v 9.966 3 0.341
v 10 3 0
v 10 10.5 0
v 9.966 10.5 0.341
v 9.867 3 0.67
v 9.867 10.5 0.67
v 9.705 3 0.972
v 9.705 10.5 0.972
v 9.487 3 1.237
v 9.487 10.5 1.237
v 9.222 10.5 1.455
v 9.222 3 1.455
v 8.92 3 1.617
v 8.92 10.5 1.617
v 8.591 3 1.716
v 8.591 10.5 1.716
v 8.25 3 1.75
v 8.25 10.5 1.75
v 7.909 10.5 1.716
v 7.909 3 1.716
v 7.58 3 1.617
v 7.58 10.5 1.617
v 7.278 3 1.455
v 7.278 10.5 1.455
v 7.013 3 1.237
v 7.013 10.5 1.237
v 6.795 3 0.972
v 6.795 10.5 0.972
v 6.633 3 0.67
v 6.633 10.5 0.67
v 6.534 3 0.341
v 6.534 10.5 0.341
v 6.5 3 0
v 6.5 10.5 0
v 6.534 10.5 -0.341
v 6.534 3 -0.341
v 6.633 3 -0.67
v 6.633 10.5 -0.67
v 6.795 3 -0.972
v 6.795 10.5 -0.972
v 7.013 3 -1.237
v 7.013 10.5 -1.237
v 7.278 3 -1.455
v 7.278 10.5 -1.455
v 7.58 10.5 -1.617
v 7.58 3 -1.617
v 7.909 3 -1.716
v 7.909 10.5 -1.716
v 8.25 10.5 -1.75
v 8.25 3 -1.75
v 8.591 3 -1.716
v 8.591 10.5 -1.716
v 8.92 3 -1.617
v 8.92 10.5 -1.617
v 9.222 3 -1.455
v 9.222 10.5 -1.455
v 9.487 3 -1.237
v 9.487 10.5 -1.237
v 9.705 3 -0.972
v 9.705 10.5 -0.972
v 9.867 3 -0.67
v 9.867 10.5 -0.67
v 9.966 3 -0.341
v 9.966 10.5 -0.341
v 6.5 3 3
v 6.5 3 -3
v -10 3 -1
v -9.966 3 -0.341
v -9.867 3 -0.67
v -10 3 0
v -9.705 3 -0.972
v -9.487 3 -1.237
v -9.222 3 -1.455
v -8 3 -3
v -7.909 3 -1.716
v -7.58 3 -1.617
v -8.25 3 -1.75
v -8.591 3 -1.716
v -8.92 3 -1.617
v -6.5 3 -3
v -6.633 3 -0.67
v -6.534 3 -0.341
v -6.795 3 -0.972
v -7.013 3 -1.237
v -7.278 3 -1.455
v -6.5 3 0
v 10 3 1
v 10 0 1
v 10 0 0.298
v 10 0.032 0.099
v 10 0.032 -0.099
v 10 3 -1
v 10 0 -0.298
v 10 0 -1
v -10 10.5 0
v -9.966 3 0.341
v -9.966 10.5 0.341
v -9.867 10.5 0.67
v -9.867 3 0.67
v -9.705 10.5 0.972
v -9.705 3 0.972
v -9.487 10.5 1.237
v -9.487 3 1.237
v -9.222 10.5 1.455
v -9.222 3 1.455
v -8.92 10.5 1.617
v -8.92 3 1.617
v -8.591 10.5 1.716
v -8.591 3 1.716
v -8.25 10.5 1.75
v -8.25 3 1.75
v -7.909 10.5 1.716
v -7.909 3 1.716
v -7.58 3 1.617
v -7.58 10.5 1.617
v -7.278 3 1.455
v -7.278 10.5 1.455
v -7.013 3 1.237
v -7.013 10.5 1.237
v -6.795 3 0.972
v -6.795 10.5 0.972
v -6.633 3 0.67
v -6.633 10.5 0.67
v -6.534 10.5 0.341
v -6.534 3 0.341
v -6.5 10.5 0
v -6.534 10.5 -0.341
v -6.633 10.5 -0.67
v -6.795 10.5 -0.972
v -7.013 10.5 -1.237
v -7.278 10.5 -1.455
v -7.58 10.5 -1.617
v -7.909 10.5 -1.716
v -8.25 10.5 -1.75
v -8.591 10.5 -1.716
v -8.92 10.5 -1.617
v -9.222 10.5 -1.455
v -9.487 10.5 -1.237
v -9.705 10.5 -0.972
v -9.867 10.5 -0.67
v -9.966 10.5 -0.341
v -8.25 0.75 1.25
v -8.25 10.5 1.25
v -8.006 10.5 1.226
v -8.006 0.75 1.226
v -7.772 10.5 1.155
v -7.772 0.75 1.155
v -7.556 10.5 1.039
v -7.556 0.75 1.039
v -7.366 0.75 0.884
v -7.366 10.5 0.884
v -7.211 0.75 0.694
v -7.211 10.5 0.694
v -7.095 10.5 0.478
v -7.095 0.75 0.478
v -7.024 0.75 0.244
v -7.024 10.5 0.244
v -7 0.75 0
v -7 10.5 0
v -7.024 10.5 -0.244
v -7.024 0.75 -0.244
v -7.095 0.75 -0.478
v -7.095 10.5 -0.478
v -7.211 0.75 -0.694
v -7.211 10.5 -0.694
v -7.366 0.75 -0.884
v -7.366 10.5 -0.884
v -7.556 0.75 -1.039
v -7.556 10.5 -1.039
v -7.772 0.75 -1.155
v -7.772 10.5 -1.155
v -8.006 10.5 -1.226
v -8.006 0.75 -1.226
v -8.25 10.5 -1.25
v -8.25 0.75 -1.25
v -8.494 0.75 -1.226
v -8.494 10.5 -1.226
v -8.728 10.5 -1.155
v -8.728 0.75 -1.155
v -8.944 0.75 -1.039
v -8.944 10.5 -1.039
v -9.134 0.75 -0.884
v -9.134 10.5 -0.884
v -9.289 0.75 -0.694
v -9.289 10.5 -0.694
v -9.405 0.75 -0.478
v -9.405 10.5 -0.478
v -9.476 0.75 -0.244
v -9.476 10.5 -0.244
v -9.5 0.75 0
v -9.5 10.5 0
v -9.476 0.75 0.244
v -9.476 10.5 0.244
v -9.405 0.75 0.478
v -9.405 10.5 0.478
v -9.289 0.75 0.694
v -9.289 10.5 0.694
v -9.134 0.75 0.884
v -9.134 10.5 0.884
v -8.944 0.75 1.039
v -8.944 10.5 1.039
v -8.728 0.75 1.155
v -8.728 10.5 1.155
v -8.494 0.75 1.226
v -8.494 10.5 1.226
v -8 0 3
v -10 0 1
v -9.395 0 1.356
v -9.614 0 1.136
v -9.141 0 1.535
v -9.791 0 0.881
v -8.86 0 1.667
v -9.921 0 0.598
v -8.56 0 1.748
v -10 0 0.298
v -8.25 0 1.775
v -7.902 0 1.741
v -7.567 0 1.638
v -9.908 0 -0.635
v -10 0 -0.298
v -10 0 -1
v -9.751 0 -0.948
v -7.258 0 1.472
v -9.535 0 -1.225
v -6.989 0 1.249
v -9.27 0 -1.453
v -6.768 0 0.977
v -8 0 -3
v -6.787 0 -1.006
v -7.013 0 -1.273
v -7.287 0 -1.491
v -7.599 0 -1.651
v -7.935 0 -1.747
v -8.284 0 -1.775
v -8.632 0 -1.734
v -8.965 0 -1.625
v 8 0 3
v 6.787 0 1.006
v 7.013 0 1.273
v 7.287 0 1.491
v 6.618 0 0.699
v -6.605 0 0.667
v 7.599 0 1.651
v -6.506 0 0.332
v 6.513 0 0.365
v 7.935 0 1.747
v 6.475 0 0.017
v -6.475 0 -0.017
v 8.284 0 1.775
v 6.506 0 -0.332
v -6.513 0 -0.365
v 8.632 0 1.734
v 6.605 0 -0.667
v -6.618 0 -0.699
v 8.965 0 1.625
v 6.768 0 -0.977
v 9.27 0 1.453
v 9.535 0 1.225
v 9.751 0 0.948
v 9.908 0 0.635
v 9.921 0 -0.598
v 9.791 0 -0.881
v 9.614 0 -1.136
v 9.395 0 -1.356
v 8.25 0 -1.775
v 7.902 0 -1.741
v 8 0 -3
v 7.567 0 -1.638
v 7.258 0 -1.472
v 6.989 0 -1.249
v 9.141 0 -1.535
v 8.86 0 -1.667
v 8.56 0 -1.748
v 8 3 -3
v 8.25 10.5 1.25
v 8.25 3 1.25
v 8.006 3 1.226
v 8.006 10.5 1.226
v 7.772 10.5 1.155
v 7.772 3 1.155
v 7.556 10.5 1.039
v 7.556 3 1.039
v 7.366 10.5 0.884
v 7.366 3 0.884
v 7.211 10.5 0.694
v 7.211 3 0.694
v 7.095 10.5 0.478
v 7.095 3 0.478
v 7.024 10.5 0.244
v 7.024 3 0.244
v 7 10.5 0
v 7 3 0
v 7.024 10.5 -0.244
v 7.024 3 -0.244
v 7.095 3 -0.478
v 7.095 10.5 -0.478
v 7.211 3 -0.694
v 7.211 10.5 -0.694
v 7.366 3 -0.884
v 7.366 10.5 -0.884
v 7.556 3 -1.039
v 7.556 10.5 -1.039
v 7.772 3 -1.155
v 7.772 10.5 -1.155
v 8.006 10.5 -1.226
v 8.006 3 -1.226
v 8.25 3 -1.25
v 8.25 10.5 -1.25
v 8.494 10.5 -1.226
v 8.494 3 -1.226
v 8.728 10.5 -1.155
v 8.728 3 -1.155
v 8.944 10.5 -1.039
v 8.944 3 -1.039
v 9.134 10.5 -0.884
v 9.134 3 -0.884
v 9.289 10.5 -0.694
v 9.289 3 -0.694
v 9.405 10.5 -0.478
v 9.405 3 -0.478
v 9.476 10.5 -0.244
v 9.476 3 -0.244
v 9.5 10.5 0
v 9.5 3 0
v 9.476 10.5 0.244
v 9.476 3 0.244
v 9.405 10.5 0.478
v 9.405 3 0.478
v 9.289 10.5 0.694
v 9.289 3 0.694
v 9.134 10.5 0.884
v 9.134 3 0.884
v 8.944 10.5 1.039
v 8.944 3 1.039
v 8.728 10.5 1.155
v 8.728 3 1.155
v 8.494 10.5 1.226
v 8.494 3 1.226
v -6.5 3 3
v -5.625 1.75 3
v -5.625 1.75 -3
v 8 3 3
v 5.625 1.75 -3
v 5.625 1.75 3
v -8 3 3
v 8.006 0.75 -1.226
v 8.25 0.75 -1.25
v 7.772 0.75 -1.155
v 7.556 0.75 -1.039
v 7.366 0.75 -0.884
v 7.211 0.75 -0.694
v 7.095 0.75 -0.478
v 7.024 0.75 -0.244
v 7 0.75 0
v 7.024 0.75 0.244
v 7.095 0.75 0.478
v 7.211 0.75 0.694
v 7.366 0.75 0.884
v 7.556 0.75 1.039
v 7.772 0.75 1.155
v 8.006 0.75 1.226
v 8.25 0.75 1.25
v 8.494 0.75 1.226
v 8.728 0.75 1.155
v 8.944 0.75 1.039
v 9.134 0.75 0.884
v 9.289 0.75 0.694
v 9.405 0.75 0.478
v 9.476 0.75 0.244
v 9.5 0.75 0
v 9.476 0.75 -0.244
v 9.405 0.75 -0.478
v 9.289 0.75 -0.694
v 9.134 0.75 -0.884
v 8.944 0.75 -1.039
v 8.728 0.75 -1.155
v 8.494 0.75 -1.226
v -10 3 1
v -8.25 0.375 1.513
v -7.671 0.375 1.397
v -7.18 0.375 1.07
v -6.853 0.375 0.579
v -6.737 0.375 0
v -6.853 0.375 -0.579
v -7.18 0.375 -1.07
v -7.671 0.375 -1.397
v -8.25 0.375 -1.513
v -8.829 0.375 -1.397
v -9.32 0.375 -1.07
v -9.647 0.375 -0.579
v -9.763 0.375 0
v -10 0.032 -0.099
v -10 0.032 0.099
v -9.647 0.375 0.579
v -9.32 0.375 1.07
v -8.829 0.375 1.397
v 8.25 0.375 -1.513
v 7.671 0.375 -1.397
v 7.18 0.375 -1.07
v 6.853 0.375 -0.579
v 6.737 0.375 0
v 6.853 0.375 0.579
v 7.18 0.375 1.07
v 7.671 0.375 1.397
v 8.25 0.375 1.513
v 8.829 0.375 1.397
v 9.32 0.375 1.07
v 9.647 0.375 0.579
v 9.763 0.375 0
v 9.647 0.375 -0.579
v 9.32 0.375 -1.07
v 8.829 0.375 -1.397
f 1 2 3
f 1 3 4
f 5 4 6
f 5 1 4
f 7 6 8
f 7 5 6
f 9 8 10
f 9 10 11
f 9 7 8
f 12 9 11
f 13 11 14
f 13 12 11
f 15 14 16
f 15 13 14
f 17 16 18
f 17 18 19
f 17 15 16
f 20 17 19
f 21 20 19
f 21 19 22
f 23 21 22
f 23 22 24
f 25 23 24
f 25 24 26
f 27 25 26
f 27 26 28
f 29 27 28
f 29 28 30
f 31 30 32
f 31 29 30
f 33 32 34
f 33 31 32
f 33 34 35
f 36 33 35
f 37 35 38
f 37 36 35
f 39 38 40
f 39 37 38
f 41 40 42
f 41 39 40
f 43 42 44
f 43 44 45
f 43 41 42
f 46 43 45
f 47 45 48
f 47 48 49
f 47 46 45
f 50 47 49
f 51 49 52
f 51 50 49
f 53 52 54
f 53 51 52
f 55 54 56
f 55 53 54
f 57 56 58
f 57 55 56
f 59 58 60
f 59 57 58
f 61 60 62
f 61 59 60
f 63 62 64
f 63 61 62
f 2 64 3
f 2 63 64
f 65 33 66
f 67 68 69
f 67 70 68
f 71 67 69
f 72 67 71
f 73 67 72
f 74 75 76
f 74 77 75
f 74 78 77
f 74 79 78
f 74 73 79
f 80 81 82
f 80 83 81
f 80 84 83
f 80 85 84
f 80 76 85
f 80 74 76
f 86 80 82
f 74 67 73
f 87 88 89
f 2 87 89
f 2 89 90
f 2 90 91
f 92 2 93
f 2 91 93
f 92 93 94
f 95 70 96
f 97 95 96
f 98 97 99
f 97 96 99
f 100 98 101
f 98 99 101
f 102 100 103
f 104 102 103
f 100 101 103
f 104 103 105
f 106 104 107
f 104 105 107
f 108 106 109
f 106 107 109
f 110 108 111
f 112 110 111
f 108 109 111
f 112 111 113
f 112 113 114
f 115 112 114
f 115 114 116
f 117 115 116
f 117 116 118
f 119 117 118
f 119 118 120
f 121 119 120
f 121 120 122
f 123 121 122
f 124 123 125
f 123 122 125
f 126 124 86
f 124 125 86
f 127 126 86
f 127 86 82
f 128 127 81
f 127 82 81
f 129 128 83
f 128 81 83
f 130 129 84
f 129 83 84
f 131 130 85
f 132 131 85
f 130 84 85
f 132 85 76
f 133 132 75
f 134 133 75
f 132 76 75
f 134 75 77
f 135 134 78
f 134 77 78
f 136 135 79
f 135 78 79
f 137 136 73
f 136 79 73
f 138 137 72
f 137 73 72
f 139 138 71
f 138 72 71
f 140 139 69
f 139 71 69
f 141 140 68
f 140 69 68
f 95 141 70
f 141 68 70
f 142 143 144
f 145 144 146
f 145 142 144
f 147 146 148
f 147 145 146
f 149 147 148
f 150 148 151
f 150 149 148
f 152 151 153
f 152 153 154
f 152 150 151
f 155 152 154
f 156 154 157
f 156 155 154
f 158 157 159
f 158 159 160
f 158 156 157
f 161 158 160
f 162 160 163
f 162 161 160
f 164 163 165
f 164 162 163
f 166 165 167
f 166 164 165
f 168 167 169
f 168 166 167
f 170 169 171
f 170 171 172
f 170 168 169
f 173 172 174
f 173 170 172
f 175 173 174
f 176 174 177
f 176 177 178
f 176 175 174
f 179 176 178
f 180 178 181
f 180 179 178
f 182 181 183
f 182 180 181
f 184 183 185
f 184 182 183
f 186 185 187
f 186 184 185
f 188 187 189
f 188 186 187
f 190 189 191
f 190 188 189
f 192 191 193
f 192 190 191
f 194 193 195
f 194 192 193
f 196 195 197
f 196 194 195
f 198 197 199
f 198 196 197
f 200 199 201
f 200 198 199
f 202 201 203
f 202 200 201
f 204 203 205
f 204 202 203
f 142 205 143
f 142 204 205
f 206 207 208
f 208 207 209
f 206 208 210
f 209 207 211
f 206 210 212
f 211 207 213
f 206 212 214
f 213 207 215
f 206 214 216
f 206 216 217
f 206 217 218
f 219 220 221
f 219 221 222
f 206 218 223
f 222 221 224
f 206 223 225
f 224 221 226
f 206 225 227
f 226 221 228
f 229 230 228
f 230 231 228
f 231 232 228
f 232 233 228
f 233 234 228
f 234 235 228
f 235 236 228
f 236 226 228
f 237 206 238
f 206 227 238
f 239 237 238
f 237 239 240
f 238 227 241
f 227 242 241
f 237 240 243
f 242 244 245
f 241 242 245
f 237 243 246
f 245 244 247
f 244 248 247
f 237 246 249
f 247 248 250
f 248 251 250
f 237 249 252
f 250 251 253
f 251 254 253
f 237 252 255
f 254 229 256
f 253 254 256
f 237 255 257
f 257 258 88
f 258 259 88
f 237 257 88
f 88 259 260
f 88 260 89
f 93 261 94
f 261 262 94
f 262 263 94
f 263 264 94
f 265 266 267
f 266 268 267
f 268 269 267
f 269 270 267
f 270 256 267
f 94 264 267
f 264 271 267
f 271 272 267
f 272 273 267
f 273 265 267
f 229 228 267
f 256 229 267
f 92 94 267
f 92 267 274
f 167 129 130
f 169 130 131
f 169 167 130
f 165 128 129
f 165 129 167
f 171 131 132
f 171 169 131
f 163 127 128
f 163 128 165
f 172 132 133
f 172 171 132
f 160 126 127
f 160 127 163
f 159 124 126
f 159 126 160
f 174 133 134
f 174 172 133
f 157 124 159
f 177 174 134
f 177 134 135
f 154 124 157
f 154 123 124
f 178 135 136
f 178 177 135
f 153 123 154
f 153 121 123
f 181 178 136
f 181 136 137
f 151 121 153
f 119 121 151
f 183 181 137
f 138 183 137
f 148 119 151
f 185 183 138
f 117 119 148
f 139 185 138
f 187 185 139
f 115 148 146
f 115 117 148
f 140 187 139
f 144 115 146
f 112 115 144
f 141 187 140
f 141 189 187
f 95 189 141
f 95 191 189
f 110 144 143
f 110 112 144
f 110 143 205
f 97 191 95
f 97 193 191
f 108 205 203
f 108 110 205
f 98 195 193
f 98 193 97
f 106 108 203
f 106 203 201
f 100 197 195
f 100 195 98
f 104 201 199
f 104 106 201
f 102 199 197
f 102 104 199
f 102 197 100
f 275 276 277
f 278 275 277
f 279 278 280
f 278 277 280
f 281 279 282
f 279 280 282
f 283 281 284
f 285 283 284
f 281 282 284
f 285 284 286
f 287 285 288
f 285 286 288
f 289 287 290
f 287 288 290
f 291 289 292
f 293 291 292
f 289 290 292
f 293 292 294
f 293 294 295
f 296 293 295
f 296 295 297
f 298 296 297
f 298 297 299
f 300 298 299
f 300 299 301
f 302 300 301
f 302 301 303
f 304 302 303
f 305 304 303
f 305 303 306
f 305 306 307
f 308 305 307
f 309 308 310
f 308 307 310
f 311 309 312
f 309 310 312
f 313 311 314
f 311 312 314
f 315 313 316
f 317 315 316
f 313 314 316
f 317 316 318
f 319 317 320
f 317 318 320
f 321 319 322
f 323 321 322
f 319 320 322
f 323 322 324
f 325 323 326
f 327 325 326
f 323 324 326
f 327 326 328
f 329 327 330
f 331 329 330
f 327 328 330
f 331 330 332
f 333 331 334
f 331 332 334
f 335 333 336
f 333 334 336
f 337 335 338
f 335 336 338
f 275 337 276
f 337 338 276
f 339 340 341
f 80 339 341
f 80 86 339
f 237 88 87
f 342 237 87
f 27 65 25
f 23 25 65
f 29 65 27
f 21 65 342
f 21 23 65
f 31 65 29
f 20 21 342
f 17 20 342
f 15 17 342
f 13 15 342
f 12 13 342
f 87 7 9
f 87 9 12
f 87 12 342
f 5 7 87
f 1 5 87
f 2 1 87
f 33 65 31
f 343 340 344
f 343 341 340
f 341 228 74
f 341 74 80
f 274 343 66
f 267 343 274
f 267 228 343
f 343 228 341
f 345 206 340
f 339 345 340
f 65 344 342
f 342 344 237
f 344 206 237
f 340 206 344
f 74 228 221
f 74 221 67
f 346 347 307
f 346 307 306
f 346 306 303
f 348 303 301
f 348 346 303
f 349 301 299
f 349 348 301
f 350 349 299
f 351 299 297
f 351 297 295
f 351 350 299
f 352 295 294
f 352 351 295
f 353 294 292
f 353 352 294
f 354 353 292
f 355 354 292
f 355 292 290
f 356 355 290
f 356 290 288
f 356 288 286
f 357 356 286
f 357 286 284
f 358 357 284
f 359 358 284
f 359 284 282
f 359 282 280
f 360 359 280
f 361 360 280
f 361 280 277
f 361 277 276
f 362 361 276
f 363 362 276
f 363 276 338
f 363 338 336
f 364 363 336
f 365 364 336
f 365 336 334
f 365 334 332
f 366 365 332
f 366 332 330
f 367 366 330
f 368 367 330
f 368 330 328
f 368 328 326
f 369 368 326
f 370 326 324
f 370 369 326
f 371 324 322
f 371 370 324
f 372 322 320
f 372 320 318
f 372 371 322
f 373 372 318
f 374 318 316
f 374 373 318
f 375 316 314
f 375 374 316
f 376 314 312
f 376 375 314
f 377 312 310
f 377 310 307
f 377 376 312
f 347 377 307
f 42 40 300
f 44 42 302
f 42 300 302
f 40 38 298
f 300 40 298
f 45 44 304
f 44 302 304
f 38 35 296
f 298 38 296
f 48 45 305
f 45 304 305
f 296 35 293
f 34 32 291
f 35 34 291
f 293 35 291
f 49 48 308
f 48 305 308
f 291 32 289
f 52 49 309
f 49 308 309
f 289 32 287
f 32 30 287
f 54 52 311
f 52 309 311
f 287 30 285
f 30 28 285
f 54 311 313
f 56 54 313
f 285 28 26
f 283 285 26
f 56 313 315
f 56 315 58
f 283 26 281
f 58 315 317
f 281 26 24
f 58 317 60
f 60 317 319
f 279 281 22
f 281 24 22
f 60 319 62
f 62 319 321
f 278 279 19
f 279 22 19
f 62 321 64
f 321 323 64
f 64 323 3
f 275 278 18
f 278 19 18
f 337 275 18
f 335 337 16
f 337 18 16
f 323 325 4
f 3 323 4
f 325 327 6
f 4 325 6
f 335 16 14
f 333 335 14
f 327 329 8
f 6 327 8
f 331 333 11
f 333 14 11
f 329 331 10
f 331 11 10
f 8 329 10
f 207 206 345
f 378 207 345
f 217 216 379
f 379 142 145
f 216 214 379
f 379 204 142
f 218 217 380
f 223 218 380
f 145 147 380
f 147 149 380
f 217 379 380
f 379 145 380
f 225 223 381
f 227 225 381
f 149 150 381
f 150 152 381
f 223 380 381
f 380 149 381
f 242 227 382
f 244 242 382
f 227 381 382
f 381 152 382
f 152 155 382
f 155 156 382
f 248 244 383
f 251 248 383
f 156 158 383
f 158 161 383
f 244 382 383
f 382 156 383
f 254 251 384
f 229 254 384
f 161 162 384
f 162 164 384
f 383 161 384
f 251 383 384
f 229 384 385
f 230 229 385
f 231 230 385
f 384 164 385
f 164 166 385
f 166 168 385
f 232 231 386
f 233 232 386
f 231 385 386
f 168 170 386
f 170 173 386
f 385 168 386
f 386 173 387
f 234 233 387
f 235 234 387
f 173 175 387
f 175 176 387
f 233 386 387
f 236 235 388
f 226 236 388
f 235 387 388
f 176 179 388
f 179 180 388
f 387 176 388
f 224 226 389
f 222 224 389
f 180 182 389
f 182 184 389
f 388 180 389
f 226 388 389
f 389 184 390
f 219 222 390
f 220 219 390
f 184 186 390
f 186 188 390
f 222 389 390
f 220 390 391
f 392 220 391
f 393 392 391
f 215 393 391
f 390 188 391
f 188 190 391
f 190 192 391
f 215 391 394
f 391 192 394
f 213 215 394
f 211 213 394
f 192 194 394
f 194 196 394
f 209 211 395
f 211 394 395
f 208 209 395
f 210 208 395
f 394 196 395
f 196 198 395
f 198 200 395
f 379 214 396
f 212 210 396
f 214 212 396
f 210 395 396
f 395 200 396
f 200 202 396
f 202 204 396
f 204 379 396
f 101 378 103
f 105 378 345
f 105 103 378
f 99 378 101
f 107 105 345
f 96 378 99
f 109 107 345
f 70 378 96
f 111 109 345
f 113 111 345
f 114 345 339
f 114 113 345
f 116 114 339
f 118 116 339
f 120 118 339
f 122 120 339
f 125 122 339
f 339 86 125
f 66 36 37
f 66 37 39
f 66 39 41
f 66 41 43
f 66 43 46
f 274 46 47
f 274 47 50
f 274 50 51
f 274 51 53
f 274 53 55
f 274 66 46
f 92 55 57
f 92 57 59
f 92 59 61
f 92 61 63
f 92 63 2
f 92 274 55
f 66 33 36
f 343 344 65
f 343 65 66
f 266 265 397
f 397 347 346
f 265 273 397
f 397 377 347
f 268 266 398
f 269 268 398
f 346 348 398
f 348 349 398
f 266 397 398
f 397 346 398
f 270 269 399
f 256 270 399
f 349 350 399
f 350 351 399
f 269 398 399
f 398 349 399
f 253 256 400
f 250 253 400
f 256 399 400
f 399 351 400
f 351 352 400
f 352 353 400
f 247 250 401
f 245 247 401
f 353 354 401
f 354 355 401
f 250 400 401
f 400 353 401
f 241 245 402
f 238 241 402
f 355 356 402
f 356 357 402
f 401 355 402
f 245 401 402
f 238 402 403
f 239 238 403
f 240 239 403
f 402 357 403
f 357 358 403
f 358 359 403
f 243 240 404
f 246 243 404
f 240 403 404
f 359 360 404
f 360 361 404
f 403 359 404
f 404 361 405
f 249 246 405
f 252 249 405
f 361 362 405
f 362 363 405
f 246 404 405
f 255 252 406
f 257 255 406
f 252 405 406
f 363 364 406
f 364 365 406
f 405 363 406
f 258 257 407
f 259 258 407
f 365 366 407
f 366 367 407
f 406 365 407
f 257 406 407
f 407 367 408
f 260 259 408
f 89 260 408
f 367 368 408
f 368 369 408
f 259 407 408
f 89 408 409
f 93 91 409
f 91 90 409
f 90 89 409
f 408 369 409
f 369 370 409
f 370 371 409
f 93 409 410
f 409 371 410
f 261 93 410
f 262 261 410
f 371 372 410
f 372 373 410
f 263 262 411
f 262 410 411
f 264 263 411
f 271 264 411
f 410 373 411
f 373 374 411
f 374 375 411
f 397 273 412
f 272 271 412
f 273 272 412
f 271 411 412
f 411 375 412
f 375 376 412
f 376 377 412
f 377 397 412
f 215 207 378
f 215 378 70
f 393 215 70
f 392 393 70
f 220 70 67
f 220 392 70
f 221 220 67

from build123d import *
from OCP.BRepFilletAPI import BRepFilletAPI_MakeChamfer

# Parameters (mm, degrees)
SKETCH1_W           = 20
SKETCH1_H           = 6
SKETCH1_R           = 1.25
BOSS_EXTRUDE1_DEPTH = 3
SKETCH2_W           = 13
SKETCH2_H           = 6
CUT_EXTRUDE1_DEPTH  = 1.25
CHAMFER1_SIZE       = 2
SKETCH3_R           = 1.75
SKETCH3_R_2         = 1.25
BOSS_EXTRUDE2_DEPTH = 7.5
CHAMFER2_SIZE       = 0.525155654
CHAMFER2_SIZE_2     = 0.75
CHAMFER3_SIZE       = 1.25
CHAMFER3_SIZE_2     = 0.875259423


# Some blends are built 0.0001 mm under size
with BuildPart() as part:
    # Sketch1 → Boss-Extrude1 (new body)
    with BuildSketch(Plane(origin=(0, 0, 0), x_dir=(1, 0, 0), z_dir=(0, 1, 0))):
        Rectangle(SKETCH1_W, SKETCH1_H)
        with Locations(Location((-8.25, 0, 0), (0, 0, 270))):
            Circle(SKETCH1_R, mode=Mode.SUBTRACT)
        with Locations(Location((8.25, 0, 0), (0, 0, 90))):
            Circle(SKETCH1_R, mode=Mode.SUBTRACT)
    extrude(amount=BOSS_EXTRUDE1_DEPTH)

    # Sketch2 → Cut-Extrude1 (cut)
    with BuildSketch(Plane(origin=(0, 3, 0), x_dir=(1, 0, 0), z_dir=(0, 1, 0))):
        Rectangle(SKETCH2_W, SKETCH2_H)
    extrude(amount=-CUT_EXTRUDE1_DEPTH, mode=Mode.SUBTRACT)

    # Chamfer1
    chamfer1_edges = [part.edges().sort_by_distance(p)[0] for p in [
        (10, 1.5, 3),
        (-10, 1.5, 3),
        (-10, 1.5, -3),
        (10, 1.5, -3),
    ]]
    chamfer(chamfer1_edges, length=CHAMFER1_SIZE)

    # Sketch3 → Boss-Extrude2 (add)
    with BuildSketch(Plane(origin=(0, 3, 0), x_dir=(1, 0, 0), z_dir=(0, 1, 0))):
        with Locations(Location((-8.25, 0, 0), (0, 0, 180))):
            Circle(SKETCH3_R)
        with Locations(Location((-8.25, 0, 0), (0, 0, 270))):
            Circle(SKETCH3_R_2, mode=Mode.SUBTRACT)
    boss_extrude2 = extrude(amount=BOSS_EXTRUDE2_DEPTH)

    # Mirror1: Boss-Extrude2 across plane
    add(boss_extrude2.mirror(Plane(origin=(0, 0, 0), x_dir=(0, 0, 1), z_dir=(1, 0, 0))))

    # Chamfer2
    # the kernel refuses this chamfer: 0.75, 0.525155654 mm, written as the material it takes off along each edge
    with BuildSketch(Plane(origin=(-8.25, 0, 0), x_dir=(0, 0, 1), z_dir=(-1, 0, 0))) as chamfer2_piece_1:
        Polygon((1.25 + CHAMFER2_SIZE, 0), (1.25, CHAMFER2_SIZE_2), (1.25, 0), align=None)
    revolve(axis=Axis((-8.25, 0, 0), (0, 1, 0)), mode=Mode.SUBTRACT)
    with BuildSketch(Plane(origin=(8.25, 0, 0), x_dir=(0, 0, -1), z_dir=(1, 0, 0))) as chamfer2_piece_2:
        Polygon((1.25 + CHAMFER2_SIZE, 0), (1.25, CHAMFER2_SIZE_2), (1.25, 0), align=None)
    revolve(axis=Axis((8.25, 0, 0), (0, 1, 0)), mode=Mode.SUBTRACT)

    # Chamfer3
    chamfer3_edges_1 = [part.edges().sort_by_distance(p)[0] for p in [
        (6.5, 1.75, 0),
    ]]
    chamfer3_side_1 = [part.faces().sort_by_distance(p)[0] for p in [
        (6.5, 1.767505188, 0),
    ]]
    chamfer3_edges_2 = [part.edges().sort_by_distance(p)[0] for p in [
        (-6.5, 1.75, 0),
    ]]
    chamfer3_side_2 = [part.faces().sort_by_distance(p)[0] for p in [
        (-6.5, 1.767505188, 0),
    ]]
    chamfer3 = BRepFilletAPI_MakeChamfer(part.part.solid().wrapped)
    for e in chamfer3_edges_1:
        chamfer3.Add(CHAMFER3_SIZE - 0.0001, CHAMFER3_SIZE_2 - 0.0001, e.wrapped, chamfer3_side_1[0].wrapped)
    for e in chamfer3_edges_2:
        chamfer3.Add(CHAMFER3_SIZE - 0.0001, CHAMFER3_SIZE_2 - 0.0001, e.wrapped, chamfer3_side_2[0].wrapped)
    add(Compound.cast(chamfer3.Shape()), mode=Mode.REPLACE)  # a hair under: the kernel refuses the full size


solid = part.part
